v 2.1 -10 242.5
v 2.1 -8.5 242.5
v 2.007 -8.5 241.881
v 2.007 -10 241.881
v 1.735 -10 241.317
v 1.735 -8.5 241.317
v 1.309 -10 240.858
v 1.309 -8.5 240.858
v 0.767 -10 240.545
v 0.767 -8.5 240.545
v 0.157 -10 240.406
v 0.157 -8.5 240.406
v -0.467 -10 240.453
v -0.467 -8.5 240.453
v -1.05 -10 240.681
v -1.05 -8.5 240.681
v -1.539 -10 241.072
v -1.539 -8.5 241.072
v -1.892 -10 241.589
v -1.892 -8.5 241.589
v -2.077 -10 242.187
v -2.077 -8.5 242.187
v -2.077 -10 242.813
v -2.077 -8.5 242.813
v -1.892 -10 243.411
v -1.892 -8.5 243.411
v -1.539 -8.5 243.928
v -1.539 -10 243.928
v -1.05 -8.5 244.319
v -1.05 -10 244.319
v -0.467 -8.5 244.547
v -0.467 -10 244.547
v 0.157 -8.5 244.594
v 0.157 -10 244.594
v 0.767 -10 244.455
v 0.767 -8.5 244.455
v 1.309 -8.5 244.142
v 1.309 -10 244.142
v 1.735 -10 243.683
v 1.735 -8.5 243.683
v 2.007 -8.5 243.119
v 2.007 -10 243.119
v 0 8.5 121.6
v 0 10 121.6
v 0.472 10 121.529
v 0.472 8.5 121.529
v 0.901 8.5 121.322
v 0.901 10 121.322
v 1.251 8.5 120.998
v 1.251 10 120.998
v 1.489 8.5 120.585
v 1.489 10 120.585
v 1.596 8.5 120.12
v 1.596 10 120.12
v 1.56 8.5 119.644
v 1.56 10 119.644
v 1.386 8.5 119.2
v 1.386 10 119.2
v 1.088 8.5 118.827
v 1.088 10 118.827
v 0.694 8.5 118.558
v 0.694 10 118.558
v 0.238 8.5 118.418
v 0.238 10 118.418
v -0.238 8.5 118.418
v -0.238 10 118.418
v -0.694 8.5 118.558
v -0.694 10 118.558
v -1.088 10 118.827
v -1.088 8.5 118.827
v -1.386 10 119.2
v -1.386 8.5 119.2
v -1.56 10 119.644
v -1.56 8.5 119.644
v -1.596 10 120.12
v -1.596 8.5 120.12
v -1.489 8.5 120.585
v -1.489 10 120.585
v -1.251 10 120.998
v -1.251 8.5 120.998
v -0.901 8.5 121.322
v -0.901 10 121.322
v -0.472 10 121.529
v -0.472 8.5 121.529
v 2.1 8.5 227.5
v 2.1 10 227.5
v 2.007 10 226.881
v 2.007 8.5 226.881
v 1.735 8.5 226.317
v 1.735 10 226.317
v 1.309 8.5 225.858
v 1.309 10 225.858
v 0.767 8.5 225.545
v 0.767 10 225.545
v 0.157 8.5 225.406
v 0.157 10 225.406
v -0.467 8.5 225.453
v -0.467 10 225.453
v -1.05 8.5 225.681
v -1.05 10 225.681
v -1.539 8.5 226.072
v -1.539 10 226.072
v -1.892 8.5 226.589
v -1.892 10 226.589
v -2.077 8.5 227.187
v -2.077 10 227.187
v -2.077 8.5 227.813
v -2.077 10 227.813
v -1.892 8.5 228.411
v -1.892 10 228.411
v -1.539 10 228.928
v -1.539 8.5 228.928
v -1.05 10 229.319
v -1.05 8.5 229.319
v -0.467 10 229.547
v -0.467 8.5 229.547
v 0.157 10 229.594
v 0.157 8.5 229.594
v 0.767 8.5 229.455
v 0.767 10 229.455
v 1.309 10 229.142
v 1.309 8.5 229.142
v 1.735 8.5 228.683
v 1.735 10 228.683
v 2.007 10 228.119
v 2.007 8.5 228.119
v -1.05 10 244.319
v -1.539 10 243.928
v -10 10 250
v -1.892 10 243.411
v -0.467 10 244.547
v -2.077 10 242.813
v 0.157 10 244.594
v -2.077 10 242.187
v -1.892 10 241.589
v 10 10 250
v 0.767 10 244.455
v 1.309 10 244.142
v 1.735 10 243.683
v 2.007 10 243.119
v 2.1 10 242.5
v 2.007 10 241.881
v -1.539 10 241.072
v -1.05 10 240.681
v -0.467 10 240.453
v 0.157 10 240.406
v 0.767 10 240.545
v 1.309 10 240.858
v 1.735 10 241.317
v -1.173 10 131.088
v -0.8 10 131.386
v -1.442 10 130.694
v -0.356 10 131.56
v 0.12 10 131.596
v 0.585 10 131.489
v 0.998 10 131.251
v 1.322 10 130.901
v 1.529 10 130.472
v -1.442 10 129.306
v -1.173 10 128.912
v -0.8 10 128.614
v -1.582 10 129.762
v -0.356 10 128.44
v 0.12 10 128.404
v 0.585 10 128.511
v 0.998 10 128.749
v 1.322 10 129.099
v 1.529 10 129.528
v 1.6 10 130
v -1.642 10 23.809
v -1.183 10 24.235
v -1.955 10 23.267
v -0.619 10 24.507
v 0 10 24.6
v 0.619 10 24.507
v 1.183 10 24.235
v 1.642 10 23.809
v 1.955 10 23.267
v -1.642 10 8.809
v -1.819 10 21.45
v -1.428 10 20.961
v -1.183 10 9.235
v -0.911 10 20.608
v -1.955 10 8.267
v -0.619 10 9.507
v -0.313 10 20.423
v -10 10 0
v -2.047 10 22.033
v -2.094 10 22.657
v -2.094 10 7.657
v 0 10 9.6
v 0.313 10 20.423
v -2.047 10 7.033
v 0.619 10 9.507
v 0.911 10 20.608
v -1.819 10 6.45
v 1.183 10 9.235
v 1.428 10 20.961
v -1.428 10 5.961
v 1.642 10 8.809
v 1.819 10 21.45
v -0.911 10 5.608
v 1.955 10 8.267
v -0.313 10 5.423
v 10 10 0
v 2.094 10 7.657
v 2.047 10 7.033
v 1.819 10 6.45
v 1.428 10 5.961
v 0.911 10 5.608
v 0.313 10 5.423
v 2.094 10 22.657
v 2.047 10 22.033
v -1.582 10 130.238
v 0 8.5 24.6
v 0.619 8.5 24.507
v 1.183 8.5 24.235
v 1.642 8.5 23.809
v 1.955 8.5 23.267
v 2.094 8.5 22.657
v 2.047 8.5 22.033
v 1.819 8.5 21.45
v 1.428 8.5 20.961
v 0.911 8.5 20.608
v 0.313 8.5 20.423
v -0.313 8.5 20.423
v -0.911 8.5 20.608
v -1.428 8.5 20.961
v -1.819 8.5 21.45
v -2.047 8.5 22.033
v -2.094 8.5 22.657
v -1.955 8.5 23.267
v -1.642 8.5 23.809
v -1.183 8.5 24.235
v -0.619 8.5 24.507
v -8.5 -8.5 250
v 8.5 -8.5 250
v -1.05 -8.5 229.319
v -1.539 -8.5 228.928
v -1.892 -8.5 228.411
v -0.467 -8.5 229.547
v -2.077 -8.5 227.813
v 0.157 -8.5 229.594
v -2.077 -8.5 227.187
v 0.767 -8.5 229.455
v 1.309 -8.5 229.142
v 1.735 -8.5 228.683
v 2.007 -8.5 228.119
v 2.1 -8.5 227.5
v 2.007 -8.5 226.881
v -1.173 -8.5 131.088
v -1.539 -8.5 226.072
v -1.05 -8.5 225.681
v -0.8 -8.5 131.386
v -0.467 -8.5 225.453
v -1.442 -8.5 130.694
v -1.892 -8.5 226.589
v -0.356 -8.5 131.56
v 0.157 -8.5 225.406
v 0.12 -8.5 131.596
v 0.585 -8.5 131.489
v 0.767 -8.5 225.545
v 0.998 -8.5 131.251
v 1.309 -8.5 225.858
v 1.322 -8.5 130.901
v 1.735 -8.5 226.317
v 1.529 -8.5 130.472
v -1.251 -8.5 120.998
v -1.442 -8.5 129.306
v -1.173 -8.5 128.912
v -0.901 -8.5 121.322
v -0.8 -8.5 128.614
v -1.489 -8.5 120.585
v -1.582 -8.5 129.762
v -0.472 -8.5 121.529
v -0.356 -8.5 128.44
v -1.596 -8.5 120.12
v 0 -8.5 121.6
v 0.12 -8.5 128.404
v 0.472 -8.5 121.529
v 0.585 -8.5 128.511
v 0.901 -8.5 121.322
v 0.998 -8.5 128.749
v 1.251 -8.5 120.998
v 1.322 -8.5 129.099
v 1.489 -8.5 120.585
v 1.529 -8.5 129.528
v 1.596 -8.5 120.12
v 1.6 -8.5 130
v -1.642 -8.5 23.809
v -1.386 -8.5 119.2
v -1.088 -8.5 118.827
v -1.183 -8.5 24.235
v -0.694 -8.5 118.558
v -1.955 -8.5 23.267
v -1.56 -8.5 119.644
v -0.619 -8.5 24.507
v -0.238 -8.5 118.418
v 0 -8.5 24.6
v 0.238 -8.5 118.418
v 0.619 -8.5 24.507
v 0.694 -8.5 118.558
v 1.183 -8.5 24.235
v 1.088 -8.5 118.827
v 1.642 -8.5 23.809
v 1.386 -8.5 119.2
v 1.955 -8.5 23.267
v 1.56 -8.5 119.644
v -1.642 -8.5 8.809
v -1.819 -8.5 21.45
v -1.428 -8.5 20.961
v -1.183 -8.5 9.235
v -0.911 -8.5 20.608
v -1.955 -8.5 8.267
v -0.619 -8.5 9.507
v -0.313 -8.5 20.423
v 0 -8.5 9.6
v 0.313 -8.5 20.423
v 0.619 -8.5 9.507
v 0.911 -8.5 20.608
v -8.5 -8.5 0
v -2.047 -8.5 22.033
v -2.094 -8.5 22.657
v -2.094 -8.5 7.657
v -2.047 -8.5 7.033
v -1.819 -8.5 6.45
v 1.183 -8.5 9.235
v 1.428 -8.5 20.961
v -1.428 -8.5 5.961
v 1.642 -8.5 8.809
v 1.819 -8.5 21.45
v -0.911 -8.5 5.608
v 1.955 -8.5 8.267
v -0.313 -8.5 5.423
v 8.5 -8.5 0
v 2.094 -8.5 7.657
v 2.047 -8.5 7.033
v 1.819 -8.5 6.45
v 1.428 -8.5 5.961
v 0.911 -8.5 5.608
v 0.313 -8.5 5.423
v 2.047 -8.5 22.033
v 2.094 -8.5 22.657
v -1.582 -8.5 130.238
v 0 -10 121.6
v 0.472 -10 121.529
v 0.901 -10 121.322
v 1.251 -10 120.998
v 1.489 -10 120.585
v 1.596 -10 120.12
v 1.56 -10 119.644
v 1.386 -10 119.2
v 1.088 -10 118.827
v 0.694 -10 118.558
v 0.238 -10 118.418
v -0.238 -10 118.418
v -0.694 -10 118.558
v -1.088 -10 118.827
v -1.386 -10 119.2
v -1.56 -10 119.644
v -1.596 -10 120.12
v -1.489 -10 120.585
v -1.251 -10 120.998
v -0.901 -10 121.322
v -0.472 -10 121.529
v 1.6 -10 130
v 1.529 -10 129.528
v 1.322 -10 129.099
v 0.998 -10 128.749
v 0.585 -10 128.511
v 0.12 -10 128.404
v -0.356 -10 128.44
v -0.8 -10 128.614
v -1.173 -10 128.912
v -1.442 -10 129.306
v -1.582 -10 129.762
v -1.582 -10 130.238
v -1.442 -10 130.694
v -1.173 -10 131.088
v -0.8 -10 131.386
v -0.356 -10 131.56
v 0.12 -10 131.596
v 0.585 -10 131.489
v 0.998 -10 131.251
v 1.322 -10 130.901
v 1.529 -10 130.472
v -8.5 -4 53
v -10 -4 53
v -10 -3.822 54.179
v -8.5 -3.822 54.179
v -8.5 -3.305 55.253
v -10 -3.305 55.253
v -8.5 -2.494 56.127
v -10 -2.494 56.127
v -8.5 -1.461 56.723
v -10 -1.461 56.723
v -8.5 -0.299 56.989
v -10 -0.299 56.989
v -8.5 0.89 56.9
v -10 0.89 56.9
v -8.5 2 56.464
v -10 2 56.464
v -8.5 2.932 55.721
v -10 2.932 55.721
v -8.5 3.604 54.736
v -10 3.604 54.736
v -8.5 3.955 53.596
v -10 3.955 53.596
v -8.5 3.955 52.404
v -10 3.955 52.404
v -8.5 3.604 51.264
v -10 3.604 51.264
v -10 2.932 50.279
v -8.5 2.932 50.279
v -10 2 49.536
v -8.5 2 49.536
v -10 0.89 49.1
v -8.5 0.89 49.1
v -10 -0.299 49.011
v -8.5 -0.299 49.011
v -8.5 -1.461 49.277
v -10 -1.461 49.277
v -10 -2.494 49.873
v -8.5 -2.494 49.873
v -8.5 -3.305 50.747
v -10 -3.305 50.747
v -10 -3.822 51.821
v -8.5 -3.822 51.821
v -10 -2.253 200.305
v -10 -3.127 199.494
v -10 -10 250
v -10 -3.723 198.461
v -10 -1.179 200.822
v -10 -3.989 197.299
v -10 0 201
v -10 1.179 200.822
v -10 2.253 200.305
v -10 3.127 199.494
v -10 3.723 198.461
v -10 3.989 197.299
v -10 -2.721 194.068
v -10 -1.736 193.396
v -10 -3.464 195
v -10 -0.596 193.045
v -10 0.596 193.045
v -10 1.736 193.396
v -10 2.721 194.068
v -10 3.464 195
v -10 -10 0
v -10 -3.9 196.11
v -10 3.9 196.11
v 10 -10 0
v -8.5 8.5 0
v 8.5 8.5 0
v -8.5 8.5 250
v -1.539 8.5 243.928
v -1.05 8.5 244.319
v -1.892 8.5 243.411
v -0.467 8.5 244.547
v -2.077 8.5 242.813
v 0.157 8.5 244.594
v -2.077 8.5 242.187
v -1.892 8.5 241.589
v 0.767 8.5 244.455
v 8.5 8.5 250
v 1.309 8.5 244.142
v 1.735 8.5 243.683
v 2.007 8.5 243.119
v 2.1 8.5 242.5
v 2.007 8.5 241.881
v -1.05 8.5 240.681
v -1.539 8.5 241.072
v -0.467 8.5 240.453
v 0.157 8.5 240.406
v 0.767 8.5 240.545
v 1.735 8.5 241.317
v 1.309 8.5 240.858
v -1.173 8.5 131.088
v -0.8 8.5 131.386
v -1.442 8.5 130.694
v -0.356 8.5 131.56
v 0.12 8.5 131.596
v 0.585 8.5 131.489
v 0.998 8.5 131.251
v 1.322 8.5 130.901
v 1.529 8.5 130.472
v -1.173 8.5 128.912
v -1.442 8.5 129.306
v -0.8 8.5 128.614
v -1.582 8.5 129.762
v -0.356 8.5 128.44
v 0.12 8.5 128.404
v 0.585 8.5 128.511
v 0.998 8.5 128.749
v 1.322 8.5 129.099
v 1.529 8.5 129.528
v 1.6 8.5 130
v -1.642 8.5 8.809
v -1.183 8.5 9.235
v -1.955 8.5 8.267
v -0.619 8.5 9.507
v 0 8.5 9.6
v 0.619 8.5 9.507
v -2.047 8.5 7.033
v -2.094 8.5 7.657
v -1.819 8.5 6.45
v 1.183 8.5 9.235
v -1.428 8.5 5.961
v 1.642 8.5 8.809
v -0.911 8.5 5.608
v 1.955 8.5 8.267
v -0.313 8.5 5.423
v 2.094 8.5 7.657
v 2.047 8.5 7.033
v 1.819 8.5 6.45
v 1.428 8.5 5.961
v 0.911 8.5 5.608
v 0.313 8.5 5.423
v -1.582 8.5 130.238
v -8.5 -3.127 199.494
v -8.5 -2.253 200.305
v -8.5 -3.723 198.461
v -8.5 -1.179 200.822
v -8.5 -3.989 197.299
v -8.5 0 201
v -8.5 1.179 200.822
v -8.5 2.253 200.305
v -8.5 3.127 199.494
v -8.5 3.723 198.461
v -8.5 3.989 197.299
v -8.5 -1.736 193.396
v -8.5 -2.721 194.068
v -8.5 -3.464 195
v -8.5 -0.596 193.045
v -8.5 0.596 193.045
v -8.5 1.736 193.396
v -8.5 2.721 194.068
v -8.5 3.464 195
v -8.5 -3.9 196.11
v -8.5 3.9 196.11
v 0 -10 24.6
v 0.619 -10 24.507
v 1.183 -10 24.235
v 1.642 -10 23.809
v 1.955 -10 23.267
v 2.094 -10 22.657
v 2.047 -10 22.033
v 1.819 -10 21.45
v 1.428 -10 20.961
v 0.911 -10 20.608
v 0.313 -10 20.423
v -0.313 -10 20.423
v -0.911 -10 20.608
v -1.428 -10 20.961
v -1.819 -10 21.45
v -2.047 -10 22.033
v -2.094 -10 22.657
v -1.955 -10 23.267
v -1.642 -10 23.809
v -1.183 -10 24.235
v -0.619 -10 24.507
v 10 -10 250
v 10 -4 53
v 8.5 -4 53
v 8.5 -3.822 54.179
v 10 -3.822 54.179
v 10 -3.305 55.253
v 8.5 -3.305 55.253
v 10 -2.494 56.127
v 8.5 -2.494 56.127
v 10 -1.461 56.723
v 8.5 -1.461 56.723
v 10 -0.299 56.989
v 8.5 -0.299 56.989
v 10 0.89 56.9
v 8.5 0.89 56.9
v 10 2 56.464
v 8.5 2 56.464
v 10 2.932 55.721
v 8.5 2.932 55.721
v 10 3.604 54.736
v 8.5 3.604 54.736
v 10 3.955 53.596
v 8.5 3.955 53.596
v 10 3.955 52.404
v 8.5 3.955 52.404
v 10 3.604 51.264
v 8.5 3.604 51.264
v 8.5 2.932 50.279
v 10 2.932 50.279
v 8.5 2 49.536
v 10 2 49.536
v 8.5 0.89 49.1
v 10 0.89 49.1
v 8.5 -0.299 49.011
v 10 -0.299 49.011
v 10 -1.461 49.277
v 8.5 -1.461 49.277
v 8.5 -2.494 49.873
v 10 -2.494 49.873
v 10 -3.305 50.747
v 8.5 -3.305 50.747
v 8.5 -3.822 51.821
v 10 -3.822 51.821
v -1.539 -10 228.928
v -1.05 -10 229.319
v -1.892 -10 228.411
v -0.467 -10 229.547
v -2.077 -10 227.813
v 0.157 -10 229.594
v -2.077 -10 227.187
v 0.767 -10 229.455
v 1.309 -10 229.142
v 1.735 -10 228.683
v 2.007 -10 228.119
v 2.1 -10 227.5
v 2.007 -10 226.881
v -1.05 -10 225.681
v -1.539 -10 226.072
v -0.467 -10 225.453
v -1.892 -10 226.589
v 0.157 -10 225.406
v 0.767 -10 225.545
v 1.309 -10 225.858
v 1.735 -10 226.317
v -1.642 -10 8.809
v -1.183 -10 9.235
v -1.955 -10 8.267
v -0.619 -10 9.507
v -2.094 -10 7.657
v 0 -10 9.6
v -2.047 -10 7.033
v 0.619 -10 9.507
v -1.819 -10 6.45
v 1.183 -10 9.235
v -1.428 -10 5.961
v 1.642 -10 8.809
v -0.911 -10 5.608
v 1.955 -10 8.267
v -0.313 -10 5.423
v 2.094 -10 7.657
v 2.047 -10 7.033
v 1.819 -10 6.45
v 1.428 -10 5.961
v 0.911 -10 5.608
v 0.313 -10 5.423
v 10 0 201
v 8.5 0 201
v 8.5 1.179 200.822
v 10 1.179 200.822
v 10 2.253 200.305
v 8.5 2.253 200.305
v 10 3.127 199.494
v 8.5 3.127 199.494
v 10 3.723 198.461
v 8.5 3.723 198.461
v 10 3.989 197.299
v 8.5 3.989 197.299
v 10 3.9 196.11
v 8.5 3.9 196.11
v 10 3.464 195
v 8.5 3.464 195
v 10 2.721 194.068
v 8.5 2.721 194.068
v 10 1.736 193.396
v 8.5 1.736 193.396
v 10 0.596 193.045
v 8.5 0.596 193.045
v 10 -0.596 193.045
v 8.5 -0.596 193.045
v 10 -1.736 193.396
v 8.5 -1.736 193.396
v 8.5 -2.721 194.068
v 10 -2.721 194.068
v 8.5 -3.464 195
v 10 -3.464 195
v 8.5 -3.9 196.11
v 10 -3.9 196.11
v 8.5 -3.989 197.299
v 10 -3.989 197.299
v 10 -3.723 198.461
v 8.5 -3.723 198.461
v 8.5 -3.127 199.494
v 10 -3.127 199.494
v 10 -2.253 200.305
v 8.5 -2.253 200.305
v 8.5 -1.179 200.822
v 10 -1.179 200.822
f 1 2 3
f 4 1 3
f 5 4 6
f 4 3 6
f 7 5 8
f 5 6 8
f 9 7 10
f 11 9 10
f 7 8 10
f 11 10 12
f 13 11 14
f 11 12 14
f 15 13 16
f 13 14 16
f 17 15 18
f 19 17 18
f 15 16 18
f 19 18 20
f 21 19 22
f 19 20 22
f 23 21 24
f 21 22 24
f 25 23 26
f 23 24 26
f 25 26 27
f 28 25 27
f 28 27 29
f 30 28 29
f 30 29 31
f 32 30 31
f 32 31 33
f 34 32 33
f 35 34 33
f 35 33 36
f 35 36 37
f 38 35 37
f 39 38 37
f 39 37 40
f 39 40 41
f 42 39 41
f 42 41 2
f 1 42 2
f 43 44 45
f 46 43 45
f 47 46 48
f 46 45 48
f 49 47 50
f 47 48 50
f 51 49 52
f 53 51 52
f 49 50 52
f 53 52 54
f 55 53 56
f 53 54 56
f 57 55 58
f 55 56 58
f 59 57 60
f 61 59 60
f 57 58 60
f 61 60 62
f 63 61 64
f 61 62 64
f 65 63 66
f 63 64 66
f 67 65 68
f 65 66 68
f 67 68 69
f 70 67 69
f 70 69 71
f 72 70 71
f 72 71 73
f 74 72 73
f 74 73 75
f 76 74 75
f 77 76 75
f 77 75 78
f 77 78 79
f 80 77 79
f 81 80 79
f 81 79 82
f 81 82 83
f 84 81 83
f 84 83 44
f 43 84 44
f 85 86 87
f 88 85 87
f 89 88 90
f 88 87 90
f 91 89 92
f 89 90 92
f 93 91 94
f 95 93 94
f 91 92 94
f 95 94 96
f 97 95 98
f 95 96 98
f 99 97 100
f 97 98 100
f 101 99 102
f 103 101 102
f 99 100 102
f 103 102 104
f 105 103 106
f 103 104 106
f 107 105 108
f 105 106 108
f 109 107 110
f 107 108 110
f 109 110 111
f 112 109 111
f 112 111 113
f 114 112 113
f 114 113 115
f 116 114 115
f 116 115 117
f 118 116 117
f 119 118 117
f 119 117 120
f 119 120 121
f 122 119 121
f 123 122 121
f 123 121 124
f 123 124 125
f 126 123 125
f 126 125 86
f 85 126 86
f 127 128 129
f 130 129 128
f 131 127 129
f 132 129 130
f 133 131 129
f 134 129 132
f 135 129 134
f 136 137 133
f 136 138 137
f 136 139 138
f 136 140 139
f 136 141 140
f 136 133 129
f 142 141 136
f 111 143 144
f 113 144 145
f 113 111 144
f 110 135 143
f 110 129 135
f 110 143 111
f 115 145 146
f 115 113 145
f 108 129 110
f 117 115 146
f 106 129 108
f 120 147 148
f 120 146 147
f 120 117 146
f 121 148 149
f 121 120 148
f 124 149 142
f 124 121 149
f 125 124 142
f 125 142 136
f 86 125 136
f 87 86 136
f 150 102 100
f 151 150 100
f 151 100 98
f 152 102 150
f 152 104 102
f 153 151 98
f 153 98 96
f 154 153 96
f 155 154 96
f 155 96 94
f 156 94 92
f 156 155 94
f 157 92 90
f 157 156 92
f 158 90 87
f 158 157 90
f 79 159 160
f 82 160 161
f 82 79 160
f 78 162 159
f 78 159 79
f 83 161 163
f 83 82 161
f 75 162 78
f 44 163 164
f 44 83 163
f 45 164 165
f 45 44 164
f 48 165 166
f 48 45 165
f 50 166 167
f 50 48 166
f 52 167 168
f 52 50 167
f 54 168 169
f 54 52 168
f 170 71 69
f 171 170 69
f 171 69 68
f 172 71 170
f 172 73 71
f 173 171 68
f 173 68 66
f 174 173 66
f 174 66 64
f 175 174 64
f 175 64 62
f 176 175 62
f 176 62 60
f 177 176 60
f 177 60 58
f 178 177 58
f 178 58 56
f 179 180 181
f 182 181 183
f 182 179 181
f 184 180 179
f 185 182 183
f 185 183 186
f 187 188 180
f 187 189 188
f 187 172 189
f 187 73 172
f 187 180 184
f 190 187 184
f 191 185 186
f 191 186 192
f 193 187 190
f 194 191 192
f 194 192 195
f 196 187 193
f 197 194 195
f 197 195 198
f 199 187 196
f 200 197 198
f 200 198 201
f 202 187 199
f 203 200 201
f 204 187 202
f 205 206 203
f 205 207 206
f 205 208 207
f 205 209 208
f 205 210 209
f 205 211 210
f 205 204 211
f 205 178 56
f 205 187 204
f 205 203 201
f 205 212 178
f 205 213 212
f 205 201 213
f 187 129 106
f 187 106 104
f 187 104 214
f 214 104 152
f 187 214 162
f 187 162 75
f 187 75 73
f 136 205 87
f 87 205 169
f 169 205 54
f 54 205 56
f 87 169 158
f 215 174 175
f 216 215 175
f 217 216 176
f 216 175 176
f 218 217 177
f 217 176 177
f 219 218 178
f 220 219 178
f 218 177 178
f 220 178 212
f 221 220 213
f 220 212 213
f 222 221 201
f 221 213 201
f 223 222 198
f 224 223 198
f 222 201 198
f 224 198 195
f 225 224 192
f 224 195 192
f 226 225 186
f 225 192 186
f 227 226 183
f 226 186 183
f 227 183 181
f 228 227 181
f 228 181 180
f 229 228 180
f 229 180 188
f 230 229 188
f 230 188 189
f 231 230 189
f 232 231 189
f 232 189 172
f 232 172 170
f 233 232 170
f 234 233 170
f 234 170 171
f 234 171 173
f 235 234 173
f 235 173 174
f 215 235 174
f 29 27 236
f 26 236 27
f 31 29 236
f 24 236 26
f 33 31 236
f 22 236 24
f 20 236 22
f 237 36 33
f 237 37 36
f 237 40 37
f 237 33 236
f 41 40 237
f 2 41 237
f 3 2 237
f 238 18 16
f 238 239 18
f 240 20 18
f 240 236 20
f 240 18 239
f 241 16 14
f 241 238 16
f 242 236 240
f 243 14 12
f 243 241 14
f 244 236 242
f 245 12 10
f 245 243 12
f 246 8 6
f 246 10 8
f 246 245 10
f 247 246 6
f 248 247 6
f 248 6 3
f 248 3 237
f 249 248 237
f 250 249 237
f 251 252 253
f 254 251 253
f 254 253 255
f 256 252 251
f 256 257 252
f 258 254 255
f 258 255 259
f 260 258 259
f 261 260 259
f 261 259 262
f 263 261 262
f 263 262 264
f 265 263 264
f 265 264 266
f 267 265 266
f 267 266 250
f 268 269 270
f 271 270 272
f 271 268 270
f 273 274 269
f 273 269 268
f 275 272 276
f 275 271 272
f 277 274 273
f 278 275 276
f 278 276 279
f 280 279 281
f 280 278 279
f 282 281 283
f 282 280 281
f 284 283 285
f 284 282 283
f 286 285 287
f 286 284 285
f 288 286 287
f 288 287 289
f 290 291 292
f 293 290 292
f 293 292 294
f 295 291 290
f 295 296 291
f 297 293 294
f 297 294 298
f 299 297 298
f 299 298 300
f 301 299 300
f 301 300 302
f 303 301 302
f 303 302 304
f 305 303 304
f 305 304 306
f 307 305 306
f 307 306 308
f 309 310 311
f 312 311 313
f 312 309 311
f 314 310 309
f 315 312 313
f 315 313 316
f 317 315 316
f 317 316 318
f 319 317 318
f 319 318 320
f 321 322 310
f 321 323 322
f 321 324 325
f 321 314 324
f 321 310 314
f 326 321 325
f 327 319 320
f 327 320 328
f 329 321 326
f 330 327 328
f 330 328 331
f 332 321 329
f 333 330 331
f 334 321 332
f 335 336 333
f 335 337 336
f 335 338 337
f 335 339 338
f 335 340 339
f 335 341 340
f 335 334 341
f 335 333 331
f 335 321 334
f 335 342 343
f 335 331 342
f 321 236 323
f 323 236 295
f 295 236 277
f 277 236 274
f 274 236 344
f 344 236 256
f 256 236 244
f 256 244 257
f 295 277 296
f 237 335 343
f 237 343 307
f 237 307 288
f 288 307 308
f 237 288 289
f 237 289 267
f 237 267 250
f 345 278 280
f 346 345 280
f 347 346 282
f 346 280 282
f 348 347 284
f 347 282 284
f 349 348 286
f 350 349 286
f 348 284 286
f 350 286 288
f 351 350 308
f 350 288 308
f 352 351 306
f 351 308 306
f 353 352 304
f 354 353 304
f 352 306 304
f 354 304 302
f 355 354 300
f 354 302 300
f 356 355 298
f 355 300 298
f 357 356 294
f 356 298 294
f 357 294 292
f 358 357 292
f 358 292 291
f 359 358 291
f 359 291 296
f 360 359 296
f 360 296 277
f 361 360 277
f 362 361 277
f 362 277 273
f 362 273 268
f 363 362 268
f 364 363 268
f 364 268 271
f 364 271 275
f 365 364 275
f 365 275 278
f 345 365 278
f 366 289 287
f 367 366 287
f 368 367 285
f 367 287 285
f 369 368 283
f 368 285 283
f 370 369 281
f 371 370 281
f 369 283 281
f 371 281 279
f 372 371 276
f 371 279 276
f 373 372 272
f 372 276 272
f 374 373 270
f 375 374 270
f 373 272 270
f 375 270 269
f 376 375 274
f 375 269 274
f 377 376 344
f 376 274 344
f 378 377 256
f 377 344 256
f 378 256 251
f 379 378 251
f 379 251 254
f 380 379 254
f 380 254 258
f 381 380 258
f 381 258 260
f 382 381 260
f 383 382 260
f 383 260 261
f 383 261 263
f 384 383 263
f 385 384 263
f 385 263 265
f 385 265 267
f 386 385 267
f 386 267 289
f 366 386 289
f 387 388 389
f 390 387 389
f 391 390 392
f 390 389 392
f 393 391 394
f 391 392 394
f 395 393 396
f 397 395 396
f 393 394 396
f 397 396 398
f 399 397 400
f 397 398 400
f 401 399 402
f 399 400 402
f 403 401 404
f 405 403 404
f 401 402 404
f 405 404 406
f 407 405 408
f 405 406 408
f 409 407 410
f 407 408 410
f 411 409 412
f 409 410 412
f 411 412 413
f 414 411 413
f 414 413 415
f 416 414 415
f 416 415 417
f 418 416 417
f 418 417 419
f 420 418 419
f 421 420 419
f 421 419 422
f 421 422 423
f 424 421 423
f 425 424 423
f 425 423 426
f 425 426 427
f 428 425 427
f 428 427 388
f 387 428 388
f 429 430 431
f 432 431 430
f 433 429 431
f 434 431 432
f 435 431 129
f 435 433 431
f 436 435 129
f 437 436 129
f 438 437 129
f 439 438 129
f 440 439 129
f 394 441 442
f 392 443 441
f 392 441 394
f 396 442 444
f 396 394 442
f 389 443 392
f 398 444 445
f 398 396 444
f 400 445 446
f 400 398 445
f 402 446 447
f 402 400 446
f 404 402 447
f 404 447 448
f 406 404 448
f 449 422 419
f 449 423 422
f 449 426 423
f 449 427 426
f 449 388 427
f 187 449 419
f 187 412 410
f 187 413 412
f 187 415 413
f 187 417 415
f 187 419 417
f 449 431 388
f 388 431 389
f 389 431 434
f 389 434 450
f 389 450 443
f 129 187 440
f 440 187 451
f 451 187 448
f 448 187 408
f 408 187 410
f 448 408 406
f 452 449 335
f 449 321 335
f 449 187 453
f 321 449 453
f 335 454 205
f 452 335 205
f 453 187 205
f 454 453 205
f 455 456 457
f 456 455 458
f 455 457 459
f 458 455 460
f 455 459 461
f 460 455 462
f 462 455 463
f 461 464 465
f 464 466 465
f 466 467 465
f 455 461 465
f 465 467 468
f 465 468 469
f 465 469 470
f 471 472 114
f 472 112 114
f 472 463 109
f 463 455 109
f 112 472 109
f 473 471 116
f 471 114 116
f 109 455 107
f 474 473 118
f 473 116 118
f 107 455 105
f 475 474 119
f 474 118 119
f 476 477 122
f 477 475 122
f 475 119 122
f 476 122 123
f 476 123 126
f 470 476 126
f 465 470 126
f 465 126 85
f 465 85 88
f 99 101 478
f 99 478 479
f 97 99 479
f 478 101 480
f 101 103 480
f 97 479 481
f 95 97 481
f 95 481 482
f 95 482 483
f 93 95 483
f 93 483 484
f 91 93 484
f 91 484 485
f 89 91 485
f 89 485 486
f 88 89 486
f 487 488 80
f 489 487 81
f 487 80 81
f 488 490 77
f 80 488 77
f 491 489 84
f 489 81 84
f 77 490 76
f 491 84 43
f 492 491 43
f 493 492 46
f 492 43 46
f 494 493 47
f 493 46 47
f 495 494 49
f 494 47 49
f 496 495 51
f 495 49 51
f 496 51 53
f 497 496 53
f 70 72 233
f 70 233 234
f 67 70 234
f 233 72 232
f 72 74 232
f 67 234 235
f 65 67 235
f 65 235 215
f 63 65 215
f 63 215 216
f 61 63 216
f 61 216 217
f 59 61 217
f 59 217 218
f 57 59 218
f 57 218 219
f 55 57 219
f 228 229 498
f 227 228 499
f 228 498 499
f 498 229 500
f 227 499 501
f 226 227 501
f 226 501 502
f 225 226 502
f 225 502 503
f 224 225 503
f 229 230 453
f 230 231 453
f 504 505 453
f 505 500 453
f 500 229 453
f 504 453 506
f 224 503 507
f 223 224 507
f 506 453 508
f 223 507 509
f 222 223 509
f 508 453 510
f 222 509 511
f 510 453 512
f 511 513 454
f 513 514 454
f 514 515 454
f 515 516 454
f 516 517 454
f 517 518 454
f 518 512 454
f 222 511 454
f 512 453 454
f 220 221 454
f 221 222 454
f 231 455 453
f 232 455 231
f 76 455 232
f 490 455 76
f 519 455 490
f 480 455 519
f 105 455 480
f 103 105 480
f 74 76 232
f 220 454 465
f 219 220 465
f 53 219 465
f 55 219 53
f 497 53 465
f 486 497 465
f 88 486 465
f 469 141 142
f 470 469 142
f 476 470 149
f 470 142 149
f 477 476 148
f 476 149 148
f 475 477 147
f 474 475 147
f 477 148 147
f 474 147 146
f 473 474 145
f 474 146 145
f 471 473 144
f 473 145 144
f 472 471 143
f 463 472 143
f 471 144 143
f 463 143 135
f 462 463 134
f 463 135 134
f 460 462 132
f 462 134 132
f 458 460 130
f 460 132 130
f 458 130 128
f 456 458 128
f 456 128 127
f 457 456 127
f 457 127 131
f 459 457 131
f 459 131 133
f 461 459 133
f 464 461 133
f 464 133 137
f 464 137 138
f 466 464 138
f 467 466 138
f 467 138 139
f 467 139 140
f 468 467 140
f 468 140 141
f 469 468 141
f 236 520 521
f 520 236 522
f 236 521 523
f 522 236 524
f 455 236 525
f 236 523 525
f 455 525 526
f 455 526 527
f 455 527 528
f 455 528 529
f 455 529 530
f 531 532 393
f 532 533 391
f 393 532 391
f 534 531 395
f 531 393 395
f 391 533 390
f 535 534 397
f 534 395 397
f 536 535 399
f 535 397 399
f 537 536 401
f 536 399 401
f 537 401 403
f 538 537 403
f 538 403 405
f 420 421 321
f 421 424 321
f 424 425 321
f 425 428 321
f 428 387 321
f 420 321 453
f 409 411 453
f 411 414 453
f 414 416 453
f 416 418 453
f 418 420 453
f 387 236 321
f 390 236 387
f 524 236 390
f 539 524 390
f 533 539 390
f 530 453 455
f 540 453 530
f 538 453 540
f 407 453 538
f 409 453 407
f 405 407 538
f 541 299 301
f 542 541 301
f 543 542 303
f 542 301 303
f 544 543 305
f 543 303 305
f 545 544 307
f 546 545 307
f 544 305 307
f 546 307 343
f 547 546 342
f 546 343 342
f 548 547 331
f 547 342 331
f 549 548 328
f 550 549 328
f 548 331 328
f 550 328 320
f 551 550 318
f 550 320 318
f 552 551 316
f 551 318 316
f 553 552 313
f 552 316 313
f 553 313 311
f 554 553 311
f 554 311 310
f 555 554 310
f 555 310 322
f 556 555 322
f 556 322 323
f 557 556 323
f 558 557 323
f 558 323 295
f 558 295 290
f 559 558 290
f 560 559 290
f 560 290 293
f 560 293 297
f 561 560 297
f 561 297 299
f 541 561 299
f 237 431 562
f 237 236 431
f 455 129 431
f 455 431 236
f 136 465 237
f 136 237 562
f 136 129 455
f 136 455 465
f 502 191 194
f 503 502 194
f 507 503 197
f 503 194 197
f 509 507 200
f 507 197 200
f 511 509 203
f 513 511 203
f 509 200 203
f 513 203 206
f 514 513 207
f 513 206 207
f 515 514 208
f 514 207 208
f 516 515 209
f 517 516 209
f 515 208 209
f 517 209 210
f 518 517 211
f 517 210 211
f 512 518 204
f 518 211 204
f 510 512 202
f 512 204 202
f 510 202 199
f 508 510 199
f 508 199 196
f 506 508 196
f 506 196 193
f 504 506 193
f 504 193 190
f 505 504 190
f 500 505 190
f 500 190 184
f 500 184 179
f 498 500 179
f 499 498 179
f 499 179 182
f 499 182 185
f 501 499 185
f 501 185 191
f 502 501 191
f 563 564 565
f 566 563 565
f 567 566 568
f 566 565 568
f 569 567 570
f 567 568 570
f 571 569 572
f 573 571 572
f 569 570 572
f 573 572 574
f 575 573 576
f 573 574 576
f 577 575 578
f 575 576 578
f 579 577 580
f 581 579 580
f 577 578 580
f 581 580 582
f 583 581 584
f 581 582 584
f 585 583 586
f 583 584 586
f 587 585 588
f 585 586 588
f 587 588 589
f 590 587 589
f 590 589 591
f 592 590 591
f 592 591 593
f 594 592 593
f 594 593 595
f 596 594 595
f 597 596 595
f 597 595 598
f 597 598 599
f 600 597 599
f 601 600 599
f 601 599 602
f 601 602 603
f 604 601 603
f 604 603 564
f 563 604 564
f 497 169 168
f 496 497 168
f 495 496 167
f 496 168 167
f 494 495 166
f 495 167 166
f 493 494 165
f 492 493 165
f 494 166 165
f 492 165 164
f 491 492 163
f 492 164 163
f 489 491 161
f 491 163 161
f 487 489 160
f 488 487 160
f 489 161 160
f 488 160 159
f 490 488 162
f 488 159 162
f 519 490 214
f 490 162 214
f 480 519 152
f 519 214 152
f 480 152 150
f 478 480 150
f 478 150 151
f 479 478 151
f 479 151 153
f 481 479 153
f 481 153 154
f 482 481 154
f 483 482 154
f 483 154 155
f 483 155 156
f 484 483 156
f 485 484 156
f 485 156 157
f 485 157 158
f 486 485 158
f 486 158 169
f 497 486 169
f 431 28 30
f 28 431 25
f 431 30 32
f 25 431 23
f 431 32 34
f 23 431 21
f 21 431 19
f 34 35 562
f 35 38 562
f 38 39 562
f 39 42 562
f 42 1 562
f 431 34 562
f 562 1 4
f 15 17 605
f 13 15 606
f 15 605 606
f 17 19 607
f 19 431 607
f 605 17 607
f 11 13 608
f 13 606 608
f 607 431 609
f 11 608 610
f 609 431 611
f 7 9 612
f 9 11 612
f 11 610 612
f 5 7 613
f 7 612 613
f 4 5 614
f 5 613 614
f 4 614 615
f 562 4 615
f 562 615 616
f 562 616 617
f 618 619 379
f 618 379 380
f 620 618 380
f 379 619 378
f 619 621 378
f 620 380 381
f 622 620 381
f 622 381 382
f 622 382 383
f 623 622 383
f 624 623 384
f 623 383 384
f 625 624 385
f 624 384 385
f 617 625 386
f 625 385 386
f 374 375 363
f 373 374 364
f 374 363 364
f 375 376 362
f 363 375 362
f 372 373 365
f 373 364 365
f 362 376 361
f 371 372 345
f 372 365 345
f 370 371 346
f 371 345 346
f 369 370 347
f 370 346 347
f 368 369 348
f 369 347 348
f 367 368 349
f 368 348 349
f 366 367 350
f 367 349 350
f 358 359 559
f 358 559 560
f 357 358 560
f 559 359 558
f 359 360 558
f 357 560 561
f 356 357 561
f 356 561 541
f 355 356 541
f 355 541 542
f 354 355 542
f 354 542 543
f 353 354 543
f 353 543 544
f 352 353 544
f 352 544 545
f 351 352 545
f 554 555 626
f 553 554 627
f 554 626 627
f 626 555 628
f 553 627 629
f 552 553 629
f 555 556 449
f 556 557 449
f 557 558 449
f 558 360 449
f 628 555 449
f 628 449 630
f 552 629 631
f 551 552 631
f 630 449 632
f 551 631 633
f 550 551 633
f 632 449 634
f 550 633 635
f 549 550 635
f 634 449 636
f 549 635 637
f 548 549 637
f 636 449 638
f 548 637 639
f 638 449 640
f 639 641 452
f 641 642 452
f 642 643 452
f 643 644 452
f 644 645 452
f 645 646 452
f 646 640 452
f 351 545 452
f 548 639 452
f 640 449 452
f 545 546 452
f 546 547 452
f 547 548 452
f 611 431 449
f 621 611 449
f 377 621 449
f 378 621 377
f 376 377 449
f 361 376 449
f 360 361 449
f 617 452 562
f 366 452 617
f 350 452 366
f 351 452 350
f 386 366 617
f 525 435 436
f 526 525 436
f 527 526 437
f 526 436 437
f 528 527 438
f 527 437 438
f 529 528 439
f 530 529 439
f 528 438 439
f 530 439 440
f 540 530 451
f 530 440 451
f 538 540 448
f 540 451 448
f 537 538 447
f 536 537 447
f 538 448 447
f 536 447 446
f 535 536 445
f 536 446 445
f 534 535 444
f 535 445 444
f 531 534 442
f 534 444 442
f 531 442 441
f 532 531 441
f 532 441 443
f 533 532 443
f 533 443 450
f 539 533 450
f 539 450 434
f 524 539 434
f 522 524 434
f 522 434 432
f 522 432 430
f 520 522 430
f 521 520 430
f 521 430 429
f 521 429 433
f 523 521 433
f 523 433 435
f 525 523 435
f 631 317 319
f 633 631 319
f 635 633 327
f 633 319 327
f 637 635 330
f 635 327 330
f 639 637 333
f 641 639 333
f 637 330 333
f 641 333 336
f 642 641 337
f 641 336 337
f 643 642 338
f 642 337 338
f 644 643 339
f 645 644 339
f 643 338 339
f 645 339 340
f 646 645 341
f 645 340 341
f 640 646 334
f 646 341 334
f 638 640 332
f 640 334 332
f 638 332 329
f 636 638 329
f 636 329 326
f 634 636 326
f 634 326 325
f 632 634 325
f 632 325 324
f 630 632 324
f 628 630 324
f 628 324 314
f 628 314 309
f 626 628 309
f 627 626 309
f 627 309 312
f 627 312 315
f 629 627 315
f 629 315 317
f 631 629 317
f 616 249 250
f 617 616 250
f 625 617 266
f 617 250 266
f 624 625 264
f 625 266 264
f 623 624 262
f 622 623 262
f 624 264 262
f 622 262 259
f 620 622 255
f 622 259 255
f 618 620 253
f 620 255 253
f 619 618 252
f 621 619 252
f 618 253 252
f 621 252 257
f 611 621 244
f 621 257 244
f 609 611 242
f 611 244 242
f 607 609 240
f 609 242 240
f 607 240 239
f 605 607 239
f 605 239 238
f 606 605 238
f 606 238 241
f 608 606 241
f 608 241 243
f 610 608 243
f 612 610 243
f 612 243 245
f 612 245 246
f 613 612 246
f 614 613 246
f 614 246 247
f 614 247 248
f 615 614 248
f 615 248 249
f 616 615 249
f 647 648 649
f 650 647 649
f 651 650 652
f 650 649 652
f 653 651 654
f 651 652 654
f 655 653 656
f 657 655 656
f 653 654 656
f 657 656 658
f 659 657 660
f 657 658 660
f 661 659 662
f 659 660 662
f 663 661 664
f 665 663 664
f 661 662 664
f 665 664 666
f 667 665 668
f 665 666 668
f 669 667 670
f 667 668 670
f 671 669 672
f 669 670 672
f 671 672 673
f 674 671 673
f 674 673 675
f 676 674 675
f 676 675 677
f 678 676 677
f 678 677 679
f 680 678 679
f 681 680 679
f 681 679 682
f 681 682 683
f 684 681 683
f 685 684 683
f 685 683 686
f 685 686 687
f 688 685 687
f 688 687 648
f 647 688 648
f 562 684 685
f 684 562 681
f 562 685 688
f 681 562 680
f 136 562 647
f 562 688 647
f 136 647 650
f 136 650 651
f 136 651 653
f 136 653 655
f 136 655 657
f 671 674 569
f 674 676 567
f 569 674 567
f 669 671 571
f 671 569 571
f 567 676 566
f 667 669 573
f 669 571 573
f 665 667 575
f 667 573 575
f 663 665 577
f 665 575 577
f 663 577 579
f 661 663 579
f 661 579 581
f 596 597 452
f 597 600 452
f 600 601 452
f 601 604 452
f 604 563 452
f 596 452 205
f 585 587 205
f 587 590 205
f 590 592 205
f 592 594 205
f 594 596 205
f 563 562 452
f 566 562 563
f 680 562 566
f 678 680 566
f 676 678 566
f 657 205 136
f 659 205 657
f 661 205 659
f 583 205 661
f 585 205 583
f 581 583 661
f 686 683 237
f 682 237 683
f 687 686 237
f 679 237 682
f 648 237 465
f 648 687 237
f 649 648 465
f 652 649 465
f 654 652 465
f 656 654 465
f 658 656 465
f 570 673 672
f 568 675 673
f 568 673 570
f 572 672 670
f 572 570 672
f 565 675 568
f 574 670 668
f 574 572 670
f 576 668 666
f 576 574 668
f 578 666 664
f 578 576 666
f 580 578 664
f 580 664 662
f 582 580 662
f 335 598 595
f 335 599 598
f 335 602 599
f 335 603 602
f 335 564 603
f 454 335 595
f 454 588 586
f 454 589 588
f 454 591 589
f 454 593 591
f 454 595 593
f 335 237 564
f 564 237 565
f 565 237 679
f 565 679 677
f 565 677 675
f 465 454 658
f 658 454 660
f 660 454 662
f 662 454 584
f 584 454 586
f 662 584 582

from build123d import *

# Parameters (mm, degrees)
SKETCH_1_W          = 20
SKETCH_1_H          = 20
SKETCH_1_W_2        = 17
SKETCH_1_H_2        = 17
EXTRUDE_1_DEPTH     = 250
SKETCH_2_R          = 2.1
SKETCH_2_R_2        = 1.6
CUT_EXTRUDE_1_DEPTH = 251.99800796
SKETCH_3_R          = 4
CUT_EXTRUDE_3_DEPTH = 251.99800796


with BuildPart() as part:
    # 草图1 → 凸台-拉伸1 (new body)
    with BuildSketch(Plane.XY):
        Rectangle(SKETCH_1_W, SKETCH_1_H)
        Rectangle(SKETCH_1_W_2, SKETCH_1_H_2, mode=Mode.SUBTRACT)
    extrude(amount=EXTRUDE_1_DEPTH)

    # 草图2 → 切除-拉伸1 (cut, through all)
    with BuildSketch(Plane(origin=(0, 10, 0), x_dir=(1, 0, 0), z_dir=(0, 1, 0))):
        with Locations(Location((0, -7.5, 0), (0, 0, 270))):
            Circle(SKETCH_2_R)
        with Locations(Location((0, -22.5, 0), (0, 0, 270))):
            Circle(SKETCH_2_R)
        with Locations(Location((0, -120, 0), (0, 0, 270))):
            Circle(SKETCH_2_R_2)
        with Locations((0, -130)):
            Circle(SKETCH_2_R_2)
        with Locations((0, -227.5)):
            Circle(SKETCH_2_R)
        with Locations((0, -242.5)):
            Circle(SKETCH_2_R)
    extrude(amount=-CUT_EXTRUDE_1_DEPTH, mode=Mode.SUBTRACT)

    # 草图3 → 切除-拉伸3 (cut, through all)
    with BuildSketch(Plane.ZY.offset(10)):
        with Locations((197, 0)):
            Circle(SKETCH_3_R)
        with Locations(Location((53, 0, 0), (0, 0, 270))):
            Circle(SKETCH_3_R)
    extrude(amount=-CUT_EXTRUDE_3_DEPTH, mode=Mode.SUBTRACT)


solid = part.part
